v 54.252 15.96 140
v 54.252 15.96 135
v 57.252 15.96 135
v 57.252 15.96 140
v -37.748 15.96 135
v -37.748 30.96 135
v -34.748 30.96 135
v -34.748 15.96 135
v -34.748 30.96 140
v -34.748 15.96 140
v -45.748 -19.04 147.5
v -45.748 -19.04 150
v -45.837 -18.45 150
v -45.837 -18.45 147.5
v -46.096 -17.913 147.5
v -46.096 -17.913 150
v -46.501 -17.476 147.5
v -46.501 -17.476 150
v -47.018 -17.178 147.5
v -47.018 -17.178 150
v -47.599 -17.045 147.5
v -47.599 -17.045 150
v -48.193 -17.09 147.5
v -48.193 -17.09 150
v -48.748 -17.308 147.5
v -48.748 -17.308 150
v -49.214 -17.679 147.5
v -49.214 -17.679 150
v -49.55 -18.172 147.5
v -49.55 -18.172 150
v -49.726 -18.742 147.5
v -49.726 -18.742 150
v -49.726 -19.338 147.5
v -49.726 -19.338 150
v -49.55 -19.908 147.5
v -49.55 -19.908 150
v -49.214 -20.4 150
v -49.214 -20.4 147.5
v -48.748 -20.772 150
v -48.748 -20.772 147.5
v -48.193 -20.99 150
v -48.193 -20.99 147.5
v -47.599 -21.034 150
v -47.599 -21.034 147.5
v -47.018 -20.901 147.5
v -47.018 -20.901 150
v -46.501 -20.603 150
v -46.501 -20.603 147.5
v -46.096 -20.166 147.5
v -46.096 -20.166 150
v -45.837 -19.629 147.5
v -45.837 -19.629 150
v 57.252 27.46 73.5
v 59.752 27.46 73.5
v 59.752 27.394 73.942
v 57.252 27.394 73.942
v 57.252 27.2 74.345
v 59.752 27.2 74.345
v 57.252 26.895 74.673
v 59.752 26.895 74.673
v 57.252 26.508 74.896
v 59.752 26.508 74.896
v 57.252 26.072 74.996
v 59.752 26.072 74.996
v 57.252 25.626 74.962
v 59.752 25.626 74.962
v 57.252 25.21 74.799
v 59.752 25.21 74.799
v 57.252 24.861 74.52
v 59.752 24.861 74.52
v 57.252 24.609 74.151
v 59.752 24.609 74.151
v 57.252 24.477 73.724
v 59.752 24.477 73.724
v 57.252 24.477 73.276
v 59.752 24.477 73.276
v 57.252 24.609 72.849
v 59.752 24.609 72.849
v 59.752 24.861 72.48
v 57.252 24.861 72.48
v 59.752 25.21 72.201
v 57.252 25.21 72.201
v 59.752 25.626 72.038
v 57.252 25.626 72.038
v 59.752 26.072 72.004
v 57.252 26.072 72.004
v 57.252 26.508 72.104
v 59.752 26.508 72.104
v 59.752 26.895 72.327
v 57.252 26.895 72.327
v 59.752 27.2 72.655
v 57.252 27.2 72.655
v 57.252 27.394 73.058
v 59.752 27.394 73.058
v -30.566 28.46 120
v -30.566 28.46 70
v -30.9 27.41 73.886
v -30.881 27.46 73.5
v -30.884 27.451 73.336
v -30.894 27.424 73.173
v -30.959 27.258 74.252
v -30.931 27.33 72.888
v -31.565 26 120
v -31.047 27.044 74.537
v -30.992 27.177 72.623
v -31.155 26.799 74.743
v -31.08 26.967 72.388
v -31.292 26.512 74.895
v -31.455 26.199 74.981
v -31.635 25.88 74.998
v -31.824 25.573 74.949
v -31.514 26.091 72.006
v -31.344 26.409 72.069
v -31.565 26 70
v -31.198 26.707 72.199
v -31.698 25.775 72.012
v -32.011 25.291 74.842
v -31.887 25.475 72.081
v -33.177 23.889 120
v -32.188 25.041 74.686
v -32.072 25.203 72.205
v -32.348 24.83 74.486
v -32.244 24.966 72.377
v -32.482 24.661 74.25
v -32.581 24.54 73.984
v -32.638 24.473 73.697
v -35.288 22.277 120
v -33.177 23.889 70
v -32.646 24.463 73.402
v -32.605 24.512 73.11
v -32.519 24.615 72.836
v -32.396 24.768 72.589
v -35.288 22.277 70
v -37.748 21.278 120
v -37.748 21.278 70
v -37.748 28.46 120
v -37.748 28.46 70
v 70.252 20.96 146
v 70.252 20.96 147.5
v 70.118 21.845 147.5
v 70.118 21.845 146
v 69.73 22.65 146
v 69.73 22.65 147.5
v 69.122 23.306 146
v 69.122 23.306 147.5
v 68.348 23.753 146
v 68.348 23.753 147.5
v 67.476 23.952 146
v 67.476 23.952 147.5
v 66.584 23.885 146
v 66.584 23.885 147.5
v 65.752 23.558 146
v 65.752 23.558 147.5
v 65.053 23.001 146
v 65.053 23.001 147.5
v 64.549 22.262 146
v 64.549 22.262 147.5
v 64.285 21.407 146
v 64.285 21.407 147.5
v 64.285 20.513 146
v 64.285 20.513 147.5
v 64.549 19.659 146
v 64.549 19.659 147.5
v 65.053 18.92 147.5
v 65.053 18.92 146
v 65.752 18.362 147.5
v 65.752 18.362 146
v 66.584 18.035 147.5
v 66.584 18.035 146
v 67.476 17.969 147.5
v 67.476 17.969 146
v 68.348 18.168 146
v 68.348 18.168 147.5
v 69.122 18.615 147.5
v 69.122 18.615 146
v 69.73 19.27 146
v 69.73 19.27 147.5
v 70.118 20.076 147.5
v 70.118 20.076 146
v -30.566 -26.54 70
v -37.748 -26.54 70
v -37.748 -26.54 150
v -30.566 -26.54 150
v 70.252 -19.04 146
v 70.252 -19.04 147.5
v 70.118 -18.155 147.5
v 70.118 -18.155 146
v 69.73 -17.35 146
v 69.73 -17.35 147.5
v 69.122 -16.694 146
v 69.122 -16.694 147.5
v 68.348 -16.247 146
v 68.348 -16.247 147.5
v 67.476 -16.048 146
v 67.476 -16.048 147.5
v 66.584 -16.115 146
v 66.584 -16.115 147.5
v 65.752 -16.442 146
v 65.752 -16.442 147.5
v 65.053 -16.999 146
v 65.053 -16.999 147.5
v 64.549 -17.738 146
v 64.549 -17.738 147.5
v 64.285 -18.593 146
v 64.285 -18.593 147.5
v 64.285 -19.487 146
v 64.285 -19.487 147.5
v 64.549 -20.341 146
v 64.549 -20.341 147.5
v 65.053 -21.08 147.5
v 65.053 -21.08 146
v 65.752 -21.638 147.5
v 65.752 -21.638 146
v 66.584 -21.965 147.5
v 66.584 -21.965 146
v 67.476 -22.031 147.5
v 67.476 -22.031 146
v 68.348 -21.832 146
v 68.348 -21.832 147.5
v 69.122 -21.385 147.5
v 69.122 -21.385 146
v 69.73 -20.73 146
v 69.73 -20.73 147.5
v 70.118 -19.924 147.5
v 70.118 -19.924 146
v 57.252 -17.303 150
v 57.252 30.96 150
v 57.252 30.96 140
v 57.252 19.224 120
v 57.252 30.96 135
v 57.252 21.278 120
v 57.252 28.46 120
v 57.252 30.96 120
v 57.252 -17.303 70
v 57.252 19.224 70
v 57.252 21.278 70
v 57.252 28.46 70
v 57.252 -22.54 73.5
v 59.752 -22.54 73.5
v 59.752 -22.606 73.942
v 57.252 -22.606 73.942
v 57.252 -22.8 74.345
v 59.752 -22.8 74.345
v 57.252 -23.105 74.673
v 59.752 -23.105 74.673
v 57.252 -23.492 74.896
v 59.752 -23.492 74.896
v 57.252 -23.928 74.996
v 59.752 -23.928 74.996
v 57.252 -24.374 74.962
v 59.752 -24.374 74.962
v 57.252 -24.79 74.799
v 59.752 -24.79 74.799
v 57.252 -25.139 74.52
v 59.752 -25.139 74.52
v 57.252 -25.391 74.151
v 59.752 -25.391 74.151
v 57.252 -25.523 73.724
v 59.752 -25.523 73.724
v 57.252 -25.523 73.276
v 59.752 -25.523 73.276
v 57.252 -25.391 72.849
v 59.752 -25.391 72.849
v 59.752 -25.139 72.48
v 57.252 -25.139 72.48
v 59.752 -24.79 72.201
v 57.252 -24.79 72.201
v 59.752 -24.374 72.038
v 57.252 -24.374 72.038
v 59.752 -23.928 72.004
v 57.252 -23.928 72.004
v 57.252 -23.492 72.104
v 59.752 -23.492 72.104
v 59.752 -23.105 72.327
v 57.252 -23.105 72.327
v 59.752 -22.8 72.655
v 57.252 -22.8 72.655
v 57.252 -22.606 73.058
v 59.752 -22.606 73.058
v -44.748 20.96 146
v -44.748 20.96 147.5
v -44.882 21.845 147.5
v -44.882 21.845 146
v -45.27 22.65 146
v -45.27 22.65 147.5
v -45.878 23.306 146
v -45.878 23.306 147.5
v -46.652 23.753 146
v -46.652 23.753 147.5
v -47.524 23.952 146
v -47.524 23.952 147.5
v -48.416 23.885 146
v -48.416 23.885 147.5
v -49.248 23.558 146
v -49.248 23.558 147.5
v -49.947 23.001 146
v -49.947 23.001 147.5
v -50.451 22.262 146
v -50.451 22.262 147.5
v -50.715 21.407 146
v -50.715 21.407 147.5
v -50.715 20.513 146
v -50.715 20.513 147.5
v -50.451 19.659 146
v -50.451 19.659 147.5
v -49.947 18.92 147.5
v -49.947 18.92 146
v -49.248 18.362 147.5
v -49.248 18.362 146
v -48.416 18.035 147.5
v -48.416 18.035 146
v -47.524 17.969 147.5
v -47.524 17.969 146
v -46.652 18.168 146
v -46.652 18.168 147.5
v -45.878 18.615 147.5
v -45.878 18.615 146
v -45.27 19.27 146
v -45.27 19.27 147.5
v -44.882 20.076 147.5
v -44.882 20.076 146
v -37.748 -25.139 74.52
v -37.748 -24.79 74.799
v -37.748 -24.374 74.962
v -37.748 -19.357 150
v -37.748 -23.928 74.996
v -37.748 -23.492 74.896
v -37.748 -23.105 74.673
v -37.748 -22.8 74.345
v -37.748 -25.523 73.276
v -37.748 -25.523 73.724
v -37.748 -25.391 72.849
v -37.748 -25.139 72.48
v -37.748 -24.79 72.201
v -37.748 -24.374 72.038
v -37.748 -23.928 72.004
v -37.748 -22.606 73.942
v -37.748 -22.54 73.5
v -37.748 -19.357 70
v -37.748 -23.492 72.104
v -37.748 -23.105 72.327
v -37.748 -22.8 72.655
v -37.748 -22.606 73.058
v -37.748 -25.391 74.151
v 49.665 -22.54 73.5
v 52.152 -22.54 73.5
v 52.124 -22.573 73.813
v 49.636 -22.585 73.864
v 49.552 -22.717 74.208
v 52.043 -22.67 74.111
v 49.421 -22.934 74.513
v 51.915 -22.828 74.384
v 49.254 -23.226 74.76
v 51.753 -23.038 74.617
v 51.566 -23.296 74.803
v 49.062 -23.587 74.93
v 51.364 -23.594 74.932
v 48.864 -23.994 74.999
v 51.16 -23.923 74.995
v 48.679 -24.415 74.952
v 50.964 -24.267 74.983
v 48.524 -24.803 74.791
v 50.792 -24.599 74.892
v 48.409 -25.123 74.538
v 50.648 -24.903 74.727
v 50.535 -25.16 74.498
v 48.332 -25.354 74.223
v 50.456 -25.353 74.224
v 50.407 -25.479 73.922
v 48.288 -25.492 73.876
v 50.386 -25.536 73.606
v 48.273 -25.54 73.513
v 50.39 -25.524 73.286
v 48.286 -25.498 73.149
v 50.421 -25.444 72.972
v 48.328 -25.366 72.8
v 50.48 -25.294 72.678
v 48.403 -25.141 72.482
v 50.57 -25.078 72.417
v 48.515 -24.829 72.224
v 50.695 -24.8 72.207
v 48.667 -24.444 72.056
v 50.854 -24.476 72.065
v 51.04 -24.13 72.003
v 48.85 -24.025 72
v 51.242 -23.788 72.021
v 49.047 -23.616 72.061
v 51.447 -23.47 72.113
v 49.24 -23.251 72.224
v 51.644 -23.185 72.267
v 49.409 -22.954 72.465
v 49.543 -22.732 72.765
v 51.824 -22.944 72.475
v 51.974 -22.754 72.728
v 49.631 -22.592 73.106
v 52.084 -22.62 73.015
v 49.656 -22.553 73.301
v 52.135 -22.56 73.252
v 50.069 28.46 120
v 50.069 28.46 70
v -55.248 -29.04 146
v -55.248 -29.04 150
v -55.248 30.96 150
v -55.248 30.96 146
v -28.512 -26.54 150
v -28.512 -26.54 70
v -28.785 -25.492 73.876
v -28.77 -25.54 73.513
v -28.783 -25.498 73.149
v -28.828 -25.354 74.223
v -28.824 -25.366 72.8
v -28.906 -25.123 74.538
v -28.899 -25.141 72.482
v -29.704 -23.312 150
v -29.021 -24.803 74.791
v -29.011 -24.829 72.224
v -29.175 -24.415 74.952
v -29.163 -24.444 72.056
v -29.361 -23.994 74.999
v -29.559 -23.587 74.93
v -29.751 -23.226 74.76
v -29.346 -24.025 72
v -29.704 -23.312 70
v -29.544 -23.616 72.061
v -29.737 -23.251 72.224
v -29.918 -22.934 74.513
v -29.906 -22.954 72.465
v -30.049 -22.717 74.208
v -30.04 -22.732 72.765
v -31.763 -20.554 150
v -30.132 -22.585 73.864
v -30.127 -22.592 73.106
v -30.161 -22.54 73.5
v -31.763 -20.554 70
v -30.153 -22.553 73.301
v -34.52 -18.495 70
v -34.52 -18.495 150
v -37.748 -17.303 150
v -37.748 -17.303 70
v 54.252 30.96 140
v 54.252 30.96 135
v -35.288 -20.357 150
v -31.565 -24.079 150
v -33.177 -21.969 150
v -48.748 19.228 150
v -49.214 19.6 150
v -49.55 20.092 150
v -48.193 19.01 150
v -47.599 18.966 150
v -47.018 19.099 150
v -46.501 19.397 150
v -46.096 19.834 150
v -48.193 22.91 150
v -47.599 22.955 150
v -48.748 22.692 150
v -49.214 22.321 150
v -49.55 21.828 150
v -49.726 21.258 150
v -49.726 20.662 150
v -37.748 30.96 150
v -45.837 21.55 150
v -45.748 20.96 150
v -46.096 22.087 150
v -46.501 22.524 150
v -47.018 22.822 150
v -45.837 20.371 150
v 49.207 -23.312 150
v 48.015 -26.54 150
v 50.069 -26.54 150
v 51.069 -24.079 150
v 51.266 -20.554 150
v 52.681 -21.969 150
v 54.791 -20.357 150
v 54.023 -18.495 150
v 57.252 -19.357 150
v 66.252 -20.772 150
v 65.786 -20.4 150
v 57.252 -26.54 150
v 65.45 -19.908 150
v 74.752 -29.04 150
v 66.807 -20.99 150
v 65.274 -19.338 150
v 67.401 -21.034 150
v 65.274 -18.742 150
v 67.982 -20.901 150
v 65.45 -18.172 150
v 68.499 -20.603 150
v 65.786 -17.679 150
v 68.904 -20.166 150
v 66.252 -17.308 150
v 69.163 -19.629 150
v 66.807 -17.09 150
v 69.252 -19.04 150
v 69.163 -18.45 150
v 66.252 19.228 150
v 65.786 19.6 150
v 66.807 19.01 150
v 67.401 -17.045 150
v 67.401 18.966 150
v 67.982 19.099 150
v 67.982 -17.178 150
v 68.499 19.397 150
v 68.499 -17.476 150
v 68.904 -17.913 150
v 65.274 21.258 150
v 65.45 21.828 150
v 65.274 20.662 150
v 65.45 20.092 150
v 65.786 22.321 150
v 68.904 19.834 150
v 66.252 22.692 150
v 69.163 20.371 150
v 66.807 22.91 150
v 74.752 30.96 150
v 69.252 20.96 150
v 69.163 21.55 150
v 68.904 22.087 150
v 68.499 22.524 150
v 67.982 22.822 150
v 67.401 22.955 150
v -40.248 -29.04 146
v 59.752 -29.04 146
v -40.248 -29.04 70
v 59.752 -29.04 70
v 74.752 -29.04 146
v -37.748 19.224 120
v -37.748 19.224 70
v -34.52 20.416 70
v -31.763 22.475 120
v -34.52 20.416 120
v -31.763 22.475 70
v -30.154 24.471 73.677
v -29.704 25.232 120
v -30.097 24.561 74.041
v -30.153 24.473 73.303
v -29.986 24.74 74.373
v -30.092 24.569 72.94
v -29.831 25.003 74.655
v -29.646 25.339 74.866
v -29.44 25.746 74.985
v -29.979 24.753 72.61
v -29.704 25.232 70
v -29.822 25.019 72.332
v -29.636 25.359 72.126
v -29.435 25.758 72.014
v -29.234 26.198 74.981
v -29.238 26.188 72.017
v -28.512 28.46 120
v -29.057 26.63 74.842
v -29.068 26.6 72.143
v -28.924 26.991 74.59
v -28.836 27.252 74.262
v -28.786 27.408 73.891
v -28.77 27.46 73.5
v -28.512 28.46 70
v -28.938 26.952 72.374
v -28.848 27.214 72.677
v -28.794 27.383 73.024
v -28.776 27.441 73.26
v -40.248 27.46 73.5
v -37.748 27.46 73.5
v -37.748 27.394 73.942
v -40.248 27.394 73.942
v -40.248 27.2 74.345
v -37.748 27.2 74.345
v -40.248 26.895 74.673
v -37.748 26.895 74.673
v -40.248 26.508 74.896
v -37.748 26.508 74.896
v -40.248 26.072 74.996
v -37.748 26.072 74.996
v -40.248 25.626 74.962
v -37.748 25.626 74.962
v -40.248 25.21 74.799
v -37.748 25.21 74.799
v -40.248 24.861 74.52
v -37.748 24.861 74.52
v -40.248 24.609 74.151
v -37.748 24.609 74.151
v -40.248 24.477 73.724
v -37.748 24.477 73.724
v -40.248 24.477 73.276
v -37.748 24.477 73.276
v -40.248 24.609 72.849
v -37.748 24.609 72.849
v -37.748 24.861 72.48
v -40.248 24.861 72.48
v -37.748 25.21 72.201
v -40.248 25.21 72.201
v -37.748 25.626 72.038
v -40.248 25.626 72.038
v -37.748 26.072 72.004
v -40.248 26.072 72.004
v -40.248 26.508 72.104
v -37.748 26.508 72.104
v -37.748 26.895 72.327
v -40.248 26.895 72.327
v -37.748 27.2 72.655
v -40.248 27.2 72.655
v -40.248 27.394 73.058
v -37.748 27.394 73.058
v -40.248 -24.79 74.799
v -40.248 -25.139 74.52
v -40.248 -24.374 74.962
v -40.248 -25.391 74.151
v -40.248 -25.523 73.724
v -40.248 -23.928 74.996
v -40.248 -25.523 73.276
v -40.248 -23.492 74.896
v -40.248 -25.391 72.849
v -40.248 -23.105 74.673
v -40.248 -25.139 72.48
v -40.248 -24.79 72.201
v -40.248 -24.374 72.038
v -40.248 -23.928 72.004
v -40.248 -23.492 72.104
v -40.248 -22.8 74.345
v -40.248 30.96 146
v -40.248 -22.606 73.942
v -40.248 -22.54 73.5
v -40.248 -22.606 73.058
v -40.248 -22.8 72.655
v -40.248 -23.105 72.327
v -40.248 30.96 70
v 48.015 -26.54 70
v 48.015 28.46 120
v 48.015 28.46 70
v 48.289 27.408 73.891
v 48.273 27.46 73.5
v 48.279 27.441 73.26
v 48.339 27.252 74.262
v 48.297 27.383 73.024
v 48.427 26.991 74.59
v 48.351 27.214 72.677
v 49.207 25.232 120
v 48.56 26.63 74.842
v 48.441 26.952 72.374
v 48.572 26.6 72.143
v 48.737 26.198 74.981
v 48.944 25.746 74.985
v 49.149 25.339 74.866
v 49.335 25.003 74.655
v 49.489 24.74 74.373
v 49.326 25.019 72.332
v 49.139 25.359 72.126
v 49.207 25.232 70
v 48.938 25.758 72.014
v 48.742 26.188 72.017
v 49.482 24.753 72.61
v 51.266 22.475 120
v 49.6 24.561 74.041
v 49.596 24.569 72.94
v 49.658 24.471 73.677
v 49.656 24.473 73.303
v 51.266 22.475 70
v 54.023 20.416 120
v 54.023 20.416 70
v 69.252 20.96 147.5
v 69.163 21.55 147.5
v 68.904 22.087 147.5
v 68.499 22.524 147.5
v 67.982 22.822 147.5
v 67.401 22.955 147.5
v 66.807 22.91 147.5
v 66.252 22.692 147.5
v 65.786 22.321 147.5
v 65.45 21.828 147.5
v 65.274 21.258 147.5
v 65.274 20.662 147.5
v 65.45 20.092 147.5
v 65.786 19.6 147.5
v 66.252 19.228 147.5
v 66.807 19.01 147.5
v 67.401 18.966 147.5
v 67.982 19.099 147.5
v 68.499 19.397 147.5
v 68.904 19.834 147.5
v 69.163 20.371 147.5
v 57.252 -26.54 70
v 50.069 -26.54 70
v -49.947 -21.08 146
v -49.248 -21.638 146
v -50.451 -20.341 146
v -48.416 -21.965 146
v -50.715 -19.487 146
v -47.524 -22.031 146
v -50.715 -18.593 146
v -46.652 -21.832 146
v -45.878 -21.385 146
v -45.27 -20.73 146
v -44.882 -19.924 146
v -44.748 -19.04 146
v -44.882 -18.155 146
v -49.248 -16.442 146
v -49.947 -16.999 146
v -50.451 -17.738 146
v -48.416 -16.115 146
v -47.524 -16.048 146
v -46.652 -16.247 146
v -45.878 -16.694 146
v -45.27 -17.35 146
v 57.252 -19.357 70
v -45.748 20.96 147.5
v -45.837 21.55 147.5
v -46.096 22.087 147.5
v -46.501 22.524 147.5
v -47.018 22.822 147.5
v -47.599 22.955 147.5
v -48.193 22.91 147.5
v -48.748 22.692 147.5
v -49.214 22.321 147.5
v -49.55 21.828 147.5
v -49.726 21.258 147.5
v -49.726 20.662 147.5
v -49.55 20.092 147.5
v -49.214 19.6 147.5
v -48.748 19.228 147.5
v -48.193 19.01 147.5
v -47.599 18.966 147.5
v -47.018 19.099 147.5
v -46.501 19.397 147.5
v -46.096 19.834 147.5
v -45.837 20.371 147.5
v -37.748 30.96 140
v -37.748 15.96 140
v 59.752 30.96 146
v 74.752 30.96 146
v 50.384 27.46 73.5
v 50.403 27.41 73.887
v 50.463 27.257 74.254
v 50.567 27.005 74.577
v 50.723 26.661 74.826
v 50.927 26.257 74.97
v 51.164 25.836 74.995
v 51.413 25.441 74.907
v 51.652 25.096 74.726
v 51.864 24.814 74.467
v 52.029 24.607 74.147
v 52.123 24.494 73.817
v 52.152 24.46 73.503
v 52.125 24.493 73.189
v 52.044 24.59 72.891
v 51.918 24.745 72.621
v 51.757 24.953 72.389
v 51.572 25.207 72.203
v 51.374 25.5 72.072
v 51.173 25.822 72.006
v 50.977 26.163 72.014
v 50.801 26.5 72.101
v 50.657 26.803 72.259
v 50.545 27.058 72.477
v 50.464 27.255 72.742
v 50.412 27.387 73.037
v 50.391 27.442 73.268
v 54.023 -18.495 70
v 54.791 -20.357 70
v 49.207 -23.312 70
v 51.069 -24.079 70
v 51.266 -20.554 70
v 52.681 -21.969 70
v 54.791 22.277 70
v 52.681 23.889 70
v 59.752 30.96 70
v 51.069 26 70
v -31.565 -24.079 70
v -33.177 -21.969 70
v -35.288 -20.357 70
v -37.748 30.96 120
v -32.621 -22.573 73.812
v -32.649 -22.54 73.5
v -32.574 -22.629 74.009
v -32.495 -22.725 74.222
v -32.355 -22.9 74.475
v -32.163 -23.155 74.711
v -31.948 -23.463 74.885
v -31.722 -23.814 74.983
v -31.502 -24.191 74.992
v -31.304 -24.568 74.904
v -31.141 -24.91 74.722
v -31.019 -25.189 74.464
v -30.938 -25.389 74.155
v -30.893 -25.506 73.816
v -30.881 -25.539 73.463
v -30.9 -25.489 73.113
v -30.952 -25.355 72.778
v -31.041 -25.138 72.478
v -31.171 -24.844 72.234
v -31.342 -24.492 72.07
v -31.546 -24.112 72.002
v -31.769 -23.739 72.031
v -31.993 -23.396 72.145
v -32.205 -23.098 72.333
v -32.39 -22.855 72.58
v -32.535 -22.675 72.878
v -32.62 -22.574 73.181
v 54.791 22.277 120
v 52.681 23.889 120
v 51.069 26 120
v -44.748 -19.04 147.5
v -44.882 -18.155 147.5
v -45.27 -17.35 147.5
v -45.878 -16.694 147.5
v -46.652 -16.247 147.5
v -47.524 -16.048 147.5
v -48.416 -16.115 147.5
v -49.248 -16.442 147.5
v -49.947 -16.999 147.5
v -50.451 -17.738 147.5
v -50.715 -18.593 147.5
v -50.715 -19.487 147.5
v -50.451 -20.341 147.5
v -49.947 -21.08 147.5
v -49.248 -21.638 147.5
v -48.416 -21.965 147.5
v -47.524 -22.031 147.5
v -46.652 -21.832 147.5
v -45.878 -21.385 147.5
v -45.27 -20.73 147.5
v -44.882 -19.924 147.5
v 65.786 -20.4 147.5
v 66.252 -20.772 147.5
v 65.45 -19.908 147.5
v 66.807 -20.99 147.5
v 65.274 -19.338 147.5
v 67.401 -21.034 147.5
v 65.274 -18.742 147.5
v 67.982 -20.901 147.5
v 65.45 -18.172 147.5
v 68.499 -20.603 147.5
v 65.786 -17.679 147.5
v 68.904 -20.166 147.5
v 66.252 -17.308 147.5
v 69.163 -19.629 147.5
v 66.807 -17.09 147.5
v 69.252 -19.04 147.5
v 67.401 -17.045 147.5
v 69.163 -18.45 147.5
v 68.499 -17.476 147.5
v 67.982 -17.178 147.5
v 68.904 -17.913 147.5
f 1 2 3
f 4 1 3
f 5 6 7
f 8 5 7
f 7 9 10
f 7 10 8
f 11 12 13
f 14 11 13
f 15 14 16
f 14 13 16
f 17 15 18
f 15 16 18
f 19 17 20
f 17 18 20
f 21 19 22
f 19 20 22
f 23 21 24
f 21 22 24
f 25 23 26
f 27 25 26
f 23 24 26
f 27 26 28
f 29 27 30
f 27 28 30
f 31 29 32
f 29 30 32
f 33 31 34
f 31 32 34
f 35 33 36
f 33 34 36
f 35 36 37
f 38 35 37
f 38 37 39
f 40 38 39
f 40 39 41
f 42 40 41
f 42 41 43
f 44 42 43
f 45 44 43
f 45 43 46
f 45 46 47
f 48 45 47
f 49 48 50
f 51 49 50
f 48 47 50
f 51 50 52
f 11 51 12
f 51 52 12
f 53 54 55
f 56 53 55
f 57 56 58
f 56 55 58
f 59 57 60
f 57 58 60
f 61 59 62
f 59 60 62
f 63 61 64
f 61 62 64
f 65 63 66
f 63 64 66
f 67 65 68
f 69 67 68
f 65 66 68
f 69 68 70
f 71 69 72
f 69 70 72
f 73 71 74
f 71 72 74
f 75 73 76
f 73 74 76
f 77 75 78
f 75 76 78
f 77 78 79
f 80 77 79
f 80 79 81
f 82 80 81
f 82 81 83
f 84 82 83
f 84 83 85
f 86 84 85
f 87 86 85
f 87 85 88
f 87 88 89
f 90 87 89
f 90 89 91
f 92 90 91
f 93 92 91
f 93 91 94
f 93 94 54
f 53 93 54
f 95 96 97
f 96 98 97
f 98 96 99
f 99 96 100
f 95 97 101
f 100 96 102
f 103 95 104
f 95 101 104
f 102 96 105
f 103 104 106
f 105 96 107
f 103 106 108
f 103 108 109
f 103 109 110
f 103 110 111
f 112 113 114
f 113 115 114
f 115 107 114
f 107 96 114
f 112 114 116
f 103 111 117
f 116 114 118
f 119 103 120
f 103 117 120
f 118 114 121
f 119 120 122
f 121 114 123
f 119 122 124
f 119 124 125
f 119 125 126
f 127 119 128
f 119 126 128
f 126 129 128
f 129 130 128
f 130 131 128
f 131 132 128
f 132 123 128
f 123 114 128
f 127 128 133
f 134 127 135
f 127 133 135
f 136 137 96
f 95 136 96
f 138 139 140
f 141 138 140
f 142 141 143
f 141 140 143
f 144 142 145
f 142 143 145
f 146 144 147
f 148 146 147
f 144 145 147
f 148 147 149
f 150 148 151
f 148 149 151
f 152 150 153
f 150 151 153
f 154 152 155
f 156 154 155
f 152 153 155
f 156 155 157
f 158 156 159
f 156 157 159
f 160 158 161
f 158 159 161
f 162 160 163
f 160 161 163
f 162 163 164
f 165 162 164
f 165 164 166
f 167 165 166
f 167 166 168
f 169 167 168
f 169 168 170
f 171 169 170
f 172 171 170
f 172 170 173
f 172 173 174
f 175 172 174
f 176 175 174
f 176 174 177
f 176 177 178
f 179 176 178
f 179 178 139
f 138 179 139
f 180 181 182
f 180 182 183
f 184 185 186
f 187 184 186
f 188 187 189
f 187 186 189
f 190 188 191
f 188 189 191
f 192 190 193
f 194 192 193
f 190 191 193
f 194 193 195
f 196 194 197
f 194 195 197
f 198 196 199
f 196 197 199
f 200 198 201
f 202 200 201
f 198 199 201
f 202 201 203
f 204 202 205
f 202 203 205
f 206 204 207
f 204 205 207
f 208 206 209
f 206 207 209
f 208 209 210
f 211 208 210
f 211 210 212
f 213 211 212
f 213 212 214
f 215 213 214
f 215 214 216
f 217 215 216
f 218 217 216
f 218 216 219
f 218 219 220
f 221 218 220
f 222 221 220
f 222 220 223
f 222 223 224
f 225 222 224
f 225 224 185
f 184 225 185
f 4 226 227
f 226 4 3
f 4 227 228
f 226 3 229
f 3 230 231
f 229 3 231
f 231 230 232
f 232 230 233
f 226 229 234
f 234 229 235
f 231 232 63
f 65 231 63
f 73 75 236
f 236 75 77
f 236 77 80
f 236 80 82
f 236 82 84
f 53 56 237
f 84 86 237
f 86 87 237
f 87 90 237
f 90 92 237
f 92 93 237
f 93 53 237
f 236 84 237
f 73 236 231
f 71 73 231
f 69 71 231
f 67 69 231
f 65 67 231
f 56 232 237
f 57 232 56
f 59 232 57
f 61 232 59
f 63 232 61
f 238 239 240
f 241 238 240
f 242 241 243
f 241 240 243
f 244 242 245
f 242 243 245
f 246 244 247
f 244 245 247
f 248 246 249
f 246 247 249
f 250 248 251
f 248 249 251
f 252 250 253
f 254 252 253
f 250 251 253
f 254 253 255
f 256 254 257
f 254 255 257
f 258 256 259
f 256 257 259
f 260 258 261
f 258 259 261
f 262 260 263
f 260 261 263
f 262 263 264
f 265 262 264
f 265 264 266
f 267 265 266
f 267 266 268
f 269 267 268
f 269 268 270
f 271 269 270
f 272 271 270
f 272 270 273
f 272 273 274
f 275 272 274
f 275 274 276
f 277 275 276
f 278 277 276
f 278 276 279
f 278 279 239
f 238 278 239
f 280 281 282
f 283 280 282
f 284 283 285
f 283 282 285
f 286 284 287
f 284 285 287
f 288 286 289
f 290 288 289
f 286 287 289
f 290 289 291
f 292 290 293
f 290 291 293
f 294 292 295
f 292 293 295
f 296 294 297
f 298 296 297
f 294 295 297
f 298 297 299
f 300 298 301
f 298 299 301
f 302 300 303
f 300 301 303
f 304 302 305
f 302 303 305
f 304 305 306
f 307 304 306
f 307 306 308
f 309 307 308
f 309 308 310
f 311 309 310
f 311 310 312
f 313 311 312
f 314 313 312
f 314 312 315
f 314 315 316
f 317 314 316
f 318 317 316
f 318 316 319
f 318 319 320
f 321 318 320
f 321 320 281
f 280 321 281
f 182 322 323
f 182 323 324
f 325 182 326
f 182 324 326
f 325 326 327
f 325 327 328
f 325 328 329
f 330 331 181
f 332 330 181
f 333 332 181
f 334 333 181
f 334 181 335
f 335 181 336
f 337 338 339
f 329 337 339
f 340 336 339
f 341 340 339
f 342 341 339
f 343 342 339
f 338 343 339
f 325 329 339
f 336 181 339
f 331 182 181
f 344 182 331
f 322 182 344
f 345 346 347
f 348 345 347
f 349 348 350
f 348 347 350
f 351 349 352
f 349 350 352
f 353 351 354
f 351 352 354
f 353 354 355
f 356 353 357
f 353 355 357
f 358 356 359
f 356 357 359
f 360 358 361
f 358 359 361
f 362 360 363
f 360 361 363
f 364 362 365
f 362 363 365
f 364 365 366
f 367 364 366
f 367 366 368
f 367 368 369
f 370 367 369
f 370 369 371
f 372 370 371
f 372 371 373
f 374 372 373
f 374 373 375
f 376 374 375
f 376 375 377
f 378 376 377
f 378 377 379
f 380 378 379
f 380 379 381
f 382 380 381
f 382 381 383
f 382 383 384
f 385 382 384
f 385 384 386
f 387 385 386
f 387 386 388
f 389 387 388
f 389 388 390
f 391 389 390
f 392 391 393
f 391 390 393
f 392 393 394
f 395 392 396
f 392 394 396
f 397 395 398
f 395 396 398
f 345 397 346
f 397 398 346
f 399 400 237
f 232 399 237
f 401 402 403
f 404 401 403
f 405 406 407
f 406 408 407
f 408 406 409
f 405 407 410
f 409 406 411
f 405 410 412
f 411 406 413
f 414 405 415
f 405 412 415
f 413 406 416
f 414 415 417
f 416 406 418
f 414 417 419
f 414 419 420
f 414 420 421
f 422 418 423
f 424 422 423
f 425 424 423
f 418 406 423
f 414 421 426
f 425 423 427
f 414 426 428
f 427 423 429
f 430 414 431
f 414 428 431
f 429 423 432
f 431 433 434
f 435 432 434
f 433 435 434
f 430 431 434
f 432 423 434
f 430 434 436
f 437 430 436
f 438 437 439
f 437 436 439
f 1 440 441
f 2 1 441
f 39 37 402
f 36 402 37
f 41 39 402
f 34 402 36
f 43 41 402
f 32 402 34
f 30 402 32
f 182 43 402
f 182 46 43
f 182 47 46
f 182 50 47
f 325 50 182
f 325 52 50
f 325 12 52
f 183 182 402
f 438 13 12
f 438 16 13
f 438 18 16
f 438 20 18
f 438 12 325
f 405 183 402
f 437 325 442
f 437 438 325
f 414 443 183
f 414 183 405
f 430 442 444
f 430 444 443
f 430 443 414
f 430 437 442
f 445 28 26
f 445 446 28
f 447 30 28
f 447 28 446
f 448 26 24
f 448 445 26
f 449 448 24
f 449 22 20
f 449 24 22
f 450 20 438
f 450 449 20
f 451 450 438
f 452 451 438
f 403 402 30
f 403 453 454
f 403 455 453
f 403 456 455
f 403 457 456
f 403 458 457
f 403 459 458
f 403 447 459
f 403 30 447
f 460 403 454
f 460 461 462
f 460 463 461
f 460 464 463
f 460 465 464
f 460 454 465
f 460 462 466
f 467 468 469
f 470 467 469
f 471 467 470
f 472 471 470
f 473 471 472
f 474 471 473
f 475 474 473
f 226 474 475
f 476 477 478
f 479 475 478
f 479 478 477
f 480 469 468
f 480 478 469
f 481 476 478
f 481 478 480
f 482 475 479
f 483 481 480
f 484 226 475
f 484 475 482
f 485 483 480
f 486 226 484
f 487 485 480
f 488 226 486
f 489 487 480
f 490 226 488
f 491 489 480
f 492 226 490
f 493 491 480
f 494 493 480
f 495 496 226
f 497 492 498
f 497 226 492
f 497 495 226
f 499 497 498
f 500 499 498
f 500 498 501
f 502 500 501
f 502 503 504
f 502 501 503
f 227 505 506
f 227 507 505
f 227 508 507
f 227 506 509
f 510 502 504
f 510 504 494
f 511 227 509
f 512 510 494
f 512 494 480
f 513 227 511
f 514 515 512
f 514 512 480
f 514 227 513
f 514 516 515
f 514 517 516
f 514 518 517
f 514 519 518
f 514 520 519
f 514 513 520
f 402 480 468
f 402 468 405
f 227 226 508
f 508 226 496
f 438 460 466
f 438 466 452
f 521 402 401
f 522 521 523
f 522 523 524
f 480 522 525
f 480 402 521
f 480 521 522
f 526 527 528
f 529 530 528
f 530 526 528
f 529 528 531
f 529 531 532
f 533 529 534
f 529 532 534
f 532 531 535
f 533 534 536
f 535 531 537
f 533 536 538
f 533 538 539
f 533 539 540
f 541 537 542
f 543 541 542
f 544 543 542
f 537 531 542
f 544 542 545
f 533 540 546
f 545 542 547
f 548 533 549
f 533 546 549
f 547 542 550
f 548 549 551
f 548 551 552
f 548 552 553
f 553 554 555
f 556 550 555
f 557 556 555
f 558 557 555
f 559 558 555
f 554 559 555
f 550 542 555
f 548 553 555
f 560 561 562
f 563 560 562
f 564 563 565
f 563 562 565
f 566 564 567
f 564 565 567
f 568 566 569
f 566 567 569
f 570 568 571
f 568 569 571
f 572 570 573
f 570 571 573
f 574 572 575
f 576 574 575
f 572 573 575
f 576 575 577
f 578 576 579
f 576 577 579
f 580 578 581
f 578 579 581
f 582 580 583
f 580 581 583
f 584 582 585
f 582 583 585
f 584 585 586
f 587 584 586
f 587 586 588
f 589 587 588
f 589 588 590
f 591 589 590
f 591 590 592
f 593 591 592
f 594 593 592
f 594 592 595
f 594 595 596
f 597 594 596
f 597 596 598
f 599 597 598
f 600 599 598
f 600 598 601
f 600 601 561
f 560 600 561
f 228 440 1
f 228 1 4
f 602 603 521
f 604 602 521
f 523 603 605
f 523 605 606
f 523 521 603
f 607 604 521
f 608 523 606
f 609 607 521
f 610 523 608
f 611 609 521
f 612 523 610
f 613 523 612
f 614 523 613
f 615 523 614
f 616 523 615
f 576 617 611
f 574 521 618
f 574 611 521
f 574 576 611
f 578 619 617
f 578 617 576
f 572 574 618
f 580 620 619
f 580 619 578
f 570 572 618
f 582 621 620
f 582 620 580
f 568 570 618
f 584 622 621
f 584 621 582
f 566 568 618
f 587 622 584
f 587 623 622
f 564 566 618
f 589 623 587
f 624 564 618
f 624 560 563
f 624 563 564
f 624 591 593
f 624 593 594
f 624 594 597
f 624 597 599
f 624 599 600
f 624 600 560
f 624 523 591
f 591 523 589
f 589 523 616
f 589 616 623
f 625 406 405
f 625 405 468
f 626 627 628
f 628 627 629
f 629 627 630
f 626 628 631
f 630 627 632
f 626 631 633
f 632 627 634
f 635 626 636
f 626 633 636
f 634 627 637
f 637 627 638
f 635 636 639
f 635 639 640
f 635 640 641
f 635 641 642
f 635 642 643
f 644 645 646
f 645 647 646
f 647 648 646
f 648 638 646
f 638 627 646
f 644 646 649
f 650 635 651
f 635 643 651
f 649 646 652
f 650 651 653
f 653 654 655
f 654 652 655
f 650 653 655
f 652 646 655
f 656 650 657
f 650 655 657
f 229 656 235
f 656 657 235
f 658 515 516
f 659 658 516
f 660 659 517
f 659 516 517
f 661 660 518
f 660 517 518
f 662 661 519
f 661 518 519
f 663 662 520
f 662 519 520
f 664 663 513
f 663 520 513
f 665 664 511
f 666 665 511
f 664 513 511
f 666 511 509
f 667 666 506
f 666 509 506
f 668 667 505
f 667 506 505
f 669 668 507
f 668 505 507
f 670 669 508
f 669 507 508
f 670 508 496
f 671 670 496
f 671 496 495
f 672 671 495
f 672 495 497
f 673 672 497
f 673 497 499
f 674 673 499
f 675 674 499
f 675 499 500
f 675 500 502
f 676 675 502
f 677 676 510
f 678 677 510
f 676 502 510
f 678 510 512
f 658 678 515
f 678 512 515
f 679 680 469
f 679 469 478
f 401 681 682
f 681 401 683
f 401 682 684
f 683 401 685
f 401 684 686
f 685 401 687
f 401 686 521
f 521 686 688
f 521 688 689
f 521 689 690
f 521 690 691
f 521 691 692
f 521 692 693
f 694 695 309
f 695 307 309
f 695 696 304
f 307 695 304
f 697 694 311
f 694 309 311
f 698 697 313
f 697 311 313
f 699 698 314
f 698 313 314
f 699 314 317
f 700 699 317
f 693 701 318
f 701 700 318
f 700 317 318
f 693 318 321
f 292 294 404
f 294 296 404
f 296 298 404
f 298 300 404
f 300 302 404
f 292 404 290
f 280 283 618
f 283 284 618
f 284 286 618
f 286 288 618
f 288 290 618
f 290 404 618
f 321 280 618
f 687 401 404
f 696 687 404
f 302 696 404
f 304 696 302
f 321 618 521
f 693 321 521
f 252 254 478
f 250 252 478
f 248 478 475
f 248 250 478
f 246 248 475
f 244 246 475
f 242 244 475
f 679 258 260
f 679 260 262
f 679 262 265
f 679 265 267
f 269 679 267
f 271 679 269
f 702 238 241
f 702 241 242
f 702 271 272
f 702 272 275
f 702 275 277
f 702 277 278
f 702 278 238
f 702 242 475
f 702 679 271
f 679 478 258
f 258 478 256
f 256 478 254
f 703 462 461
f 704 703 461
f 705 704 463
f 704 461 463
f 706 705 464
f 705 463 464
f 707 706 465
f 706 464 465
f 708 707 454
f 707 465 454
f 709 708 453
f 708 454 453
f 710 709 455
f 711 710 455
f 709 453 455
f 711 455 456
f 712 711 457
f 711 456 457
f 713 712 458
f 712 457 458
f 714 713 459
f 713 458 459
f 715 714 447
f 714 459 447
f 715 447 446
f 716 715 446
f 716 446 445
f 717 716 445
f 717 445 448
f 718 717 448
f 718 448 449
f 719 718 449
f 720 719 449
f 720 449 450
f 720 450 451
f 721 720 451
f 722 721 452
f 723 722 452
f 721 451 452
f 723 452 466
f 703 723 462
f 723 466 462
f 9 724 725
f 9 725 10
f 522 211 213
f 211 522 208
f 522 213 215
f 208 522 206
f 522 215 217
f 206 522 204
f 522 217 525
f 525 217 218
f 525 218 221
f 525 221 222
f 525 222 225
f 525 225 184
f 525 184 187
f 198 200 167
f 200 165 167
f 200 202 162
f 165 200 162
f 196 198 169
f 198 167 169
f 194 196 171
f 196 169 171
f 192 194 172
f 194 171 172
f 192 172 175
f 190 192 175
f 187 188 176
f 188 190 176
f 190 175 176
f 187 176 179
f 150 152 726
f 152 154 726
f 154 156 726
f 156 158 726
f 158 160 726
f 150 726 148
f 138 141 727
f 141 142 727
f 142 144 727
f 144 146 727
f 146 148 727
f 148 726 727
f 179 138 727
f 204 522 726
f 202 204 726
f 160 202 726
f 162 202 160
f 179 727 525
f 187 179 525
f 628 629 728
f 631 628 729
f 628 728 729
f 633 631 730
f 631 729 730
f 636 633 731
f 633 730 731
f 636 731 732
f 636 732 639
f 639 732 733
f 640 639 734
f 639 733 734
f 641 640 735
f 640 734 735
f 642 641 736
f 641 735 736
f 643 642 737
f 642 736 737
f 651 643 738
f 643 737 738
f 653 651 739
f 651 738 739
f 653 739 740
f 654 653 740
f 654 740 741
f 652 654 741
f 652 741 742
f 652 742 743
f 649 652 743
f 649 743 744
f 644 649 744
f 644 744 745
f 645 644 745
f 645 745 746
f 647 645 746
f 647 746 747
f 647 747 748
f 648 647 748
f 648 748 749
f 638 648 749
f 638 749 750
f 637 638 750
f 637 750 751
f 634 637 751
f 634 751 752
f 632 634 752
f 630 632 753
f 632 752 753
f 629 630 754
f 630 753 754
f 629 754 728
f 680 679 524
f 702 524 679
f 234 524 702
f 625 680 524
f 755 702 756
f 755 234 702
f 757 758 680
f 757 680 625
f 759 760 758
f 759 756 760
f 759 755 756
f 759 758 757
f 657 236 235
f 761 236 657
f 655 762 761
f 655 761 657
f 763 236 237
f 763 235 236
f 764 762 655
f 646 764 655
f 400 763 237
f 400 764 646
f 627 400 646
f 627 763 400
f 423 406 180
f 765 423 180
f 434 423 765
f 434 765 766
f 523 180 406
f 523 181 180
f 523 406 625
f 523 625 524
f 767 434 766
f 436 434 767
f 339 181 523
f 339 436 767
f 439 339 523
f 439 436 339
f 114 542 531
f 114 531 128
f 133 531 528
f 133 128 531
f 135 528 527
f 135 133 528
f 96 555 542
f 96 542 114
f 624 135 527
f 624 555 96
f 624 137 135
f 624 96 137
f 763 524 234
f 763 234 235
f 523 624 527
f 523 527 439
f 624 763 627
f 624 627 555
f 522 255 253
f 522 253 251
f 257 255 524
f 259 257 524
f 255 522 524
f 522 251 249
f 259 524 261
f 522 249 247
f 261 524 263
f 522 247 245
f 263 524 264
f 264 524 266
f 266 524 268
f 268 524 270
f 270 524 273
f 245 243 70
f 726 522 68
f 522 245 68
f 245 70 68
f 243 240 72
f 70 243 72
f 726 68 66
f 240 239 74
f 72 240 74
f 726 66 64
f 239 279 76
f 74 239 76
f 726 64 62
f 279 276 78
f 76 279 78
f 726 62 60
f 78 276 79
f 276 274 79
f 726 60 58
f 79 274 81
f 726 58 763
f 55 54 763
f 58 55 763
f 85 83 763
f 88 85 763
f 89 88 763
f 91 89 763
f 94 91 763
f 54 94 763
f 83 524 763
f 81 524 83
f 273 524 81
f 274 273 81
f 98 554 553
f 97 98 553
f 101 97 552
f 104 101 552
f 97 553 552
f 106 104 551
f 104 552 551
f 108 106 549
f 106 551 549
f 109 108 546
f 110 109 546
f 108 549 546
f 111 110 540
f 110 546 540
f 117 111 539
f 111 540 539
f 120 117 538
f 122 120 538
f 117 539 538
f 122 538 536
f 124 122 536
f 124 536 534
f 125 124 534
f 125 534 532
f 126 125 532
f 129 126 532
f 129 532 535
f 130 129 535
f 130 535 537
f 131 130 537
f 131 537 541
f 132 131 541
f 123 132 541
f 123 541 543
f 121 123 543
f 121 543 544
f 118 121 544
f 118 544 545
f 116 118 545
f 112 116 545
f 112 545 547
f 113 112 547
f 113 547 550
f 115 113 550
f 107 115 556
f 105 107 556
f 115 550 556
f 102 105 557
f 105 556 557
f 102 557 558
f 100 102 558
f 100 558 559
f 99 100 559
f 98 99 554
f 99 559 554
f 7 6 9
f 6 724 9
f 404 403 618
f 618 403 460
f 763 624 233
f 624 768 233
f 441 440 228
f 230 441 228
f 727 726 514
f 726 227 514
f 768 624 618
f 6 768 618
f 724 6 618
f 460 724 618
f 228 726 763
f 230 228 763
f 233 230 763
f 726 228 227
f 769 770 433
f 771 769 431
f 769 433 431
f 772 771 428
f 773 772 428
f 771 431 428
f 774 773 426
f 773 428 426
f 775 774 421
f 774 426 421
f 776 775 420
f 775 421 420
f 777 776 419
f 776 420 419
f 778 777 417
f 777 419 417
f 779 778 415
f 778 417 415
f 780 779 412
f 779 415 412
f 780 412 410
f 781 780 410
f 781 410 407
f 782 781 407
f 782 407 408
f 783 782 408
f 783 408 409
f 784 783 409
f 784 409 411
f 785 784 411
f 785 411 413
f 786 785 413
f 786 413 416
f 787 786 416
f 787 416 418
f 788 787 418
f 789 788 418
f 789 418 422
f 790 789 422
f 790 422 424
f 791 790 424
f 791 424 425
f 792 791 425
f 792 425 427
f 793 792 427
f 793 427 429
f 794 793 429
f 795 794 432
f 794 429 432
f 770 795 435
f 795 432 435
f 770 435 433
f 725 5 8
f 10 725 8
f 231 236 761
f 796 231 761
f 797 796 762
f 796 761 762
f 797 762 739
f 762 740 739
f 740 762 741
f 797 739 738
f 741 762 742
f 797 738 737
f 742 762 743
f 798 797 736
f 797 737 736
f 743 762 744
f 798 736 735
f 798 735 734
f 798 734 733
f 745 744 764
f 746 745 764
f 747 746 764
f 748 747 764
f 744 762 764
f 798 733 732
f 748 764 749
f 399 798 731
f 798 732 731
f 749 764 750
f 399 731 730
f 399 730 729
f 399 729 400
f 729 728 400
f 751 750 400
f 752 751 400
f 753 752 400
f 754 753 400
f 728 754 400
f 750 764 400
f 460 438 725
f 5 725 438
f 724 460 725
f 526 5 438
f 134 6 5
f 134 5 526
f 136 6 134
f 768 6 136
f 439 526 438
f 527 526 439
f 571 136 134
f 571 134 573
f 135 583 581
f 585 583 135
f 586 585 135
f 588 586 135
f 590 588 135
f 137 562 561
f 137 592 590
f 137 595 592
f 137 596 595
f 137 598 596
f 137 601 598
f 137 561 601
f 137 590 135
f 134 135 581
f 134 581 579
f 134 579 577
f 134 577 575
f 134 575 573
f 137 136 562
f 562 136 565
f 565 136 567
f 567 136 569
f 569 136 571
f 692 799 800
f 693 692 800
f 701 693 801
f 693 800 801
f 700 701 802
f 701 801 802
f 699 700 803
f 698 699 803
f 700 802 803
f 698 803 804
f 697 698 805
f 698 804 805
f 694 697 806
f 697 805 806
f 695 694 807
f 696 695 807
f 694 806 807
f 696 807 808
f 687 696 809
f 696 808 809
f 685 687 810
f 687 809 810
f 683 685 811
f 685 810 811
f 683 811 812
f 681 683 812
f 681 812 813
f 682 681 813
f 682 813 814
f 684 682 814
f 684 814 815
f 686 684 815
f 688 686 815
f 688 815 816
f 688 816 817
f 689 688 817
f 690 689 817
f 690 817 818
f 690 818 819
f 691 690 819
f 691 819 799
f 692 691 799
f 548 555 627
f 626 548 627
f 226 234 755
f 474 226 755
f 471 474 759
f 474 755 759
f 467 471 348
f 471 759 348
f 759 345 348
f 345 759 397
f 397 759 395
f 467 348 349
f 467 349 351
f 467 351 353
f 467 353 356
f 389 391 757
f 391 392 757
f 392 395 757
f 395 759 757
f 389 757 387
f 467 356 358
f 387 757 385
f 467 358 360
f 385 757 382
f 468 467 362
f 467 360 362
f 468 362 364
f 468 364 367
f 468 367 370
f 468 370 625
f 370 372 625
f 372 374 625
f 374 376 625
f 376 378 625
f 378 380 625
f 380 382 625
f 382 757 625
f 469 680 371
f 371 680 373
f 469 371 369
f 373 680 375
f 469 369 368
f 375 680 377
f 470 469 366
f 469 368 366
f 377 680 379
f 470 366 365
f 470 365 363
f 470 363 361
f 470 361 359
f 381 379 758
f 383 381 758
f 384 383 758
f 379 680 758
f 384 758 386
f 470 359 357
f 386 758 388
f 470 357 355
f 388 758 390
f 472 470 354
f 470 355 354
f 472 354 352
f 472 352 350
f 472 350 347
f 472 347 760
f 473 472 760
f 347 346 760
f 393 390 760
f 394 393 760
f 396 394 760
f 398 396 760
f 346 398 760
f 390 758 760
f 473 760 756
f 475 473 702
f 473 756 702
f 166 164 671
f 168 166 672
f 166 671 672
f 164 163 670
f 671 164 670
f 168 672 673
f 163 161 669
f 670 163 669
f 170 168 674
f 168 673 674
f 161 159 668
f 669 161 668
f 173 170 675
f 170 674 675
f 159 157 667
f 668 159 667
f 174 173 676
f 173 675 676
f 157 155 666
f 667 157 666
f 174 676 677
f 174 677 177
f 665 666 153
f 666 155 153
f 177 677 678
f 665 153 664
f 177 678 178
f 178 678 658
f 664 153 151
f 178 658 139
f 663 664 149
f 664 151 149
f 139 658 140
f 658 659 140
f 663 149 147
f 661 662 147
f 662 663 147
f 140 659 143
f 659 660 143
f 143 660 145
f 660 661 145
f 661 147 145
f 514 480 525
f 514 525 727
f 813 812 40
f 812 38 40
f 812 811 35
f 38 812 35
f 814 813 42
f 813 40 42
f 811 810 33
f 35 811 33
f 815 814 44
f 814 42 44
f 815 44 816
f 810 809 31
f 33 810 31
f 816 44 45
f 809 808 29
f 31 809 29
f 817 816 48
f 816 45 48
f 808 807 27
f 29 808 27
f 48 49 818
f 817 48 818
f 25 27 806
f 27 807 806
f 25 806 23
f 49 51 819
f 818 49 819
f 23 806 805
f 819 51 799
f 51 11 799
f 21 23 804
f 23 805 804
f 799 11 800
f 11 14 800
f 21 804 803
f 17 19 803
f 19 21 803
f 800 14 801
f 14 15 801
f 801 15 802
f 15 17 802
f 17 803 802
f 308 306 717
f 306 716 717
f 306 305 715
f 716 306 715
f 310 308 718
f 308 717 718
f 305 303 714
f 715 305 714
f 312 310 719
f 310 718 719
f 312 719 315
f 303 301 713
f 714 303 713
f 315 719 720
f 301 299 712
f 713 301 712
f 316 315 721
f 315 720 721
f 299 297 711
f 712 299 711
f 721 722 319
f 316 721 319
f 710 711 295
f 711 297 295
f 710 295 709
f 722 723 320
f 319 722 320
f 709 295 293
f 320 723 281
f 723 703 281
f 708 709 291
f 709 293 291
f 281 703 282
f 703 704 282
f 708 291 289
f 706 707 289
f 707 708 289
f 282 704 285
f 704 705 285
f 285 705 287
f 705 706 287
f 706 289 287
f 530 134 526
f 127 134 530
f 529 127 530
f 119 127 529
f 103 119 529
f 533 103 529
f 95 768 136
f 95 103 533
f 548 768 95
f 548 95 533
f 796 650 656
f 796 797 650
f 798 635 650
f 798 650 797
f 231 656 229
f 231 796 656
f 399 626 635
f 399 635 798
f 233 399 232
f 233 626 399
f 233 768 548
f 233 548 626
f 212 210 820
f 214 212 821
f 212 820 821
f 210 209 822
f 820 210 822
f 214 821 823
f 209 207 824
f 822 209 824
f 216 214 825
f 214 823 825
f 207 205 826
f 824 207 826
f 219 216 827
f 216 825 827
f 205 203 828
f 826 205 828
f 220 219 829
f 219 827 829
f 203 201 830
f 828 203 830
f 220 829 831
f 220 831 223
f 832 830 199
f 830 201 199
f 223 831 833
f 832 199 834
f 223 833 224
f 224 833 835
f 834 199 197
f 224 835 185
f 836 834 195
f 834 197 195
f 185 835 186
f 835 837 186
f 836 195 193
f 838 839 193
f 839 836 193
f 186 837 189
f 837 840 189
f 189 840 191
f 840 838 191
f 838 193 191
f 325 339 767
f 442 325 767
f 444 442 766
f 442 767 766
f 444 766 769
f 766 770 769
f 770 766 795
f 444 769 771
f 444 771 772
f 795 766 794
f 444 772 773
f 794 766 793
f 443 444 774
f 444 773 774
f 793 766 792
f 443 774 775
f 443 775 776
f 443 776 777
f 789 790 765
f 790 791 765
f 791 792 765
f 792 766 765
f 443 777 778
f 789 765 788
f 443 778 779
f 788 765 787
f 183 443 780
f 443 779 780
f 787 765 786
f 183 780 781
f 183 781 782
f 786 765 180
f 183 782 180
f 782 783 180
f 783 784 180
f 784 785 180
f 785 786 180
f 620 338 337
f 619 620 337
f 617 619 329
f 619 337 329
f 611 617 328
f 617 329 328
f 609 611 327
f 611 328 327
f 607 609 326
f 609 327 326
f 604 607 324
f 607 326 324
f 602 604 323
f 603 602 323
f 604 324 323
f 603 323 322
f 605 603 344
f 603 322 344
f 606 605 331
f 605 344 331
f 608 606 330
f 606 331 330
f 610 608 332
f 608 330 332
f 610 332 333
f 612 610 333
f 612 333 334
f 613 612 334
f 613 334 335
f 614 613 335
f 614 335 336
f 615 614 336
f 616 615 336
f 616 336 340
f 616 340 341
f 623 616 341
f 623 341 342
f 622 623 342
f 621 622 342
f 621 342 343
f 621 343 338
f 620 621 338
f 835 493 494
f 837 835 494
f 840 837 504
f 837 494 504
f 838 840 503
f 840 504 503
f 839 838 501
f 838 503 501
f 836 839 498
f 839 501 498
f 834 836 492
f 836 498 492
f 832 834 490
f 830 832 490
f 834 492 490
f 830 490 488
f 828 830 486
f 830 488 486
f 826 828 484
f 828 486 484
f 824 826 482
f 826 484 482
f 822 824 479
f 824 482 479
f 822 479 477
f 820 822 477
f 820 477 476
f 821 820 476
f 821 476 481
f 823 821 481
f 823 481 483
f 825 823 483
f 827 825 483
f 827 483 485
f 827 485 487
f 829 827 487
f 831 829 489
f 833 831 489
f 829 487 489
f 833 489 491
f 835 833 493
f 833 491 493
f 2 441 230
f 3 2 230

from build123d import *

# Parameters (mm, degrees)
SKETCH1_W                = 100
SKETCH1_H                = 60
BOSS_EXTRUDE1_DEPTH      = 150
SKETCH2_W                = 95
SKETCH2_H                = 30
CUT_EXTRUDE1_DEPTH       = 20
BOSS_EXTRUDE2_DEPTH      = 13
BOSS_EXTRUDE2_DEPTH_BACK = 5
SKETCH3_W                = 106
SKETCH3_H                = 66
SKETCH3_W_2              = 100
SKETCH3_H_2              = 60
SKETCH4_R                = 1.5
CUT_EXTRUDE2_DEPTH       = 120
SKETCH5_R                = 3
CUT_EXTRUDE3_DEPTH       = 1
CUT_EXTRUDE4_START       = -1
SKETCH6_R                = 3
CUT_EXTRUDE4_DEPTH       = 1
SKETCH8_W                = 157.221191822
SKETCH8_H                = 99.5531871
CUT_EXTRUDE6_DEPTH       = 83
SKETCH9_R                = 1.5
CUT_EXTRUDE7_DEPTH       = 120
SKETCH10_W               = 3
SKETCH10_H               = 5
BOSS_EXTRUDE3_DEPTH      = 15
SKETCH11_W               = 15
SKETCH11_H               = 60
SKETCH11_R               = 3
BOSS_EXTRUDE4_DEPTH      = 4
SKETCH11_3_R             = 3
SKETCH11_3_R_2           = 2
BOSS_EXTRUDE5_DEPTH      = 2.5


with BuildPart() as part:
    # Sketch1 → Boss-Extrude1 (new body)
    with BuildSketch(Plane.XY):
        with Locations((9.751655629, 0.960264901)):
            Rectangle(SKETCH1_W, SKETCH1_H)
        with BuildLine():
            Line((-37.748344371, 21.277806535), (-37.748344371, 28.460264901))
            Line((-37.748344371, 28.460264901), (-30.565886005, 28.460264901))
            ThreePointArc((-30.565886005, 28.460264901), (-33.177276559, 23.889197089), (-37.748344371, 21.277806535))
        make_face(mode=Mode.SUBTRACT)
        with BuildLine():
            Line((-37.748344371, -17.303040505), (-37.748344371, 19.223570306))
            ThreePointArc((-37.748344371, 19.223570306), (-31.763062997, 22.474983526), (-28.511649777, 28.460264901))
            Line((-28.511649777, 28.460264901), (48.014961035, 28.460264901))
            ThreePointArc((48.014961035, 28.460264901), (51.266374255, 22.474983526), (57.251655629, 19.223570306))
            Line((57.251655629, 19.223570306), (57.251655629, -17.303040505))
            ThreePointArc((57.251655629, -17.303040505), (51.266374255, -20.554453725), (48.014961035, -26.539735099))
            Line((48.014961035, -26.539735099), (-28.511649777, -26.539735099))
            ThreePointArc((-28.511649777, -26.539735099), (-31.763062997, -20.554453725), (-37.748344371, -17.303040505))
        make_face(mode=Mode.SUBTRACT)
        with BuildLine():
            Line((-37.748344371, -26.539735099), (-37.748344371, -19.357276734))
            ThreePointArc((-37.748344371, -19.357276734), (-33.177276559, -21.968667287), (-30.565886005, -26.539735099))
            Line((-30.565886005, -26.539735099), (-37.748344371, -26.539735099))
        make_face(mode=Mode.SUBTRACT)
        with BuildLine():
            Line((57.251655629, -26.539735099), (50.069197264, -26.539735099))
            ThreePointArc((50.069197264, -26.539735099), (52.680587817, -21.968667287), (57.251655629, -19.357276734))
            Line((57.251655629, -19.357276734), (57.251655629, -26.539735099))
        make_face(mode=Mode.SUBTRACT)
        with BuildLine():
            Line((57.251655629, 28.460264901), (57.251655629, 21.277806535))
            ThreePointArc((57.251655629, 21.277806535), (52.680587817, 23.889197089), (50.069197264, 28.460264901))
            Line((50.069197264, 28.460264901), (57.251655629, 28.460264901))
        make_face(mode=Mode.SUBTRACT)
    extrude(amount=BOSS_EXTRUDE1_DEPTH)

    # Sketch2 → Cut-Extrude1 (cut)
    with BuildSketch(Plane(origin=(0, 30.960264901, 0), x_dir=(1, 0, 0), z_dir=(0, 1, 0))):
        with Locations((9.751655629, -135)):
            Rectangle(SKETCH2_W, SKETCH2_H)
    extrude(amount=-CUT_EXTRUDE1_DEPTH, mode=Mode.SUBTRACT)

    # Sketch3 → Boss-Extrude2 (add, two sides: drawn at the far end of the back side and taken through both)
    with BuildSketch(Plane(origin=(0, 0, 0), x_dir=(-1, 0, 0), z_dir=(0, 0, -1)).offset(-BOSS_EXTRUDE2_DEPTH_BACK)):
        with Locations((-9.751655629, 0.960264901)):
            Rectangle(SKETCH3_W, SKETCH3_H)
        with Locations((-9.751655629, 0.960264901)):
            Rectangle(SKETCH3_W_2, SKETCH3_H_2, mode=Mode.SUBTRACT)
    extrude(amount=BOSS_EXTRUDE2_DEPTH + BOSS_EXTRUDE2_DEPTH_BACK)

    # Sketch4 → Cut-Extrude2 (cut)
    with BuildSketch(Plane.ZY.offset(43.248344371)):
        with Locations((-4, -24.039735099)):
            Circle(SKETCH4_R)
        with Locations((-4, 25.960264901)):
            Circle(SKETCH4_R)
    extrude(amount=-CUT_EXTRUDE2_DEPTH, mode=Mode.SUBTRACT)

    # Sketch5 → Cut-Extrude3 (cut)
    with BuildSketch(Plane(origin=(62.751655629, 0, 0), x_dir=(0, 0, -1), z_dir=(1, 0, 0))):
        with Locations((4, -24.039735099)):
            Circle(SKETCH5_R)
        with Locations((4, 25.960264901)):
            Circle(SKETCH5_R)
    extrude(amount=-CUT_EXTRUDE3_DEPTH, mode=Mode.SUBTRACT)

    # Sketch6 → Cut-Extrude4 (cut)
    with BuildSketch(Plane.ZY.offset(43.248344371).offset(CUT_EXTRUDE4_START)):
        with Locations((-4, 25.960264901)):
            Circle(SKETCH6_R)
        with Locations((-4, -24.087684502)):
            Circle(SKETCH6_R)
    extrude(amount=CUT_EXTRUDE4_DEPTH, mode=Mode.SUBTRACT)

    # Sketch8 → Cut-Extrude6 (cut)
    with BuildSketch(Plane(origin=(0, 0, -13), x_dir=(-1, 0, 0), z_dir=(0, 0, -1))):
        with Locations((-4.996574538, 1.162608777)):
            Rectangle(SKETCH8_W, SKETCH8_H)
    extrude(amount=-CUT_EXTRUDE6_DEPTH, mode=Mode.SUBTRACT)

    # Sketch9 → Cut-Extrude7 (cut)
    with BuildSketch(Plane(origin=(59.751655629, 0, 0), x_dir=(0, 0, -1), z_dir=(1, 0, 0))):
        with Locations((-73.5, -24.039735099)):
            Circle(SKETCH9_R)
        with Locations((-73.5, 25.960264901)):
            Circle(SKETCH9_R)
    extrude(amount=-CUT_EXTRUDE7_DEPTH, mode=Mode.SUBTRACT)

    # Sketch10 → Boss-Extrude3 (add)
    with BuildSketch(Plane(origin=(0, 30.960264901, 0), x_dir=(1, 0, 0), z_dir=(0, 1, 0))):
        with Locations((-36.248344371, -137.5)):
            Rectangle(SKETCH10_W, SKETCH10_H)
        with Locations((55.751655629, -137.5)):
            Rectangle(SKETCH10_W, SKETCH10_H)
    extrude(amount=-BOSS_EXTRUDE3_DEPTH)

    # Sketch11 → Boss-Extrude4 (add)
    # profile 1 of 2: a face of its own
    with BuildSketch(Plane.XY.offset(150)):
        with Locations((-47.748344371, 0.960264901)):
            Rectangle(SKETCH11_W, SKETCH11_H)
        with Locations((-47.748344371, -19.039735099)):
            Circle(SKETCH11_R, mode=Mode.SUBTRACT)
        with Locations((-47.748344371, 20.960264901)):
            Circle(SKETCH11_R, mode=Mode.SUBTRACT)
    # profile 2 of 2: a face of its own
    with BuildSketch(Plane.XY.offset(150)):
        with Locations((67.251655629, 0.960264901)):
            Rectangle(SKETCH11_W, SKETCH11_H)
        with Locations((67.251655629, -19.039735099)):
            Circle(SKETCH11_R, mode=Mode.SUBTRACT)
        with Locations((67.251655629, 20.960264901)):
            Circle(SKETCH11_R, mode=Mode.SUBTRACT)
    extrude(amount=-BOSS_EXTRUDE4_DEPTH)

    # Sketch11<3> → Boss-Extrude5 (add)
    # profile 1 of 4: a face of its own
    with BuildSketch(Plane.XY.offset(150)):
        with Locations((-47.748344371, -19.039735099)):
            Circle(SKETCH11_3_R)
        with Locations((-47.748344371, -19.039735099)):
            Circle(SKETCH11_3_R_2, mode=Mode.SUBTRACT)
    # profile 2 of 4: a face of its own
    with BuildSketch(Plane.XY.offset(150)):
        with Locations((67.251655629, 20.960264901)):
            Circle(SKETCH11_3_R)
        with Locations((67.251655629, 20.960264901)):
            Circle(SKETCH11_3_R_2, mode=Mode.SUBTRACT)
    # profile 3 of 4: a face of its own
    with BuildSketch(Plane.XY.offset(150)):
        with Locations((67.251655629, -19.039735099)):
            Circle(SKETCH11_3_R)
        with Locations((67.251655629, -19.039735099)):
            Circle(SKETCH11_3_R_2, mode=Mode.SUBTRACT)
    # profile 4 of 4: a face of its own
    with BuildSketch(Plane.XY.offset(150)):
        with Locations((-47.748344371, 20.960264901)):
            Circle(SKETCH11_3_R)
        with Locations((-47.748344371, 20.960264901)):
            Circle(SKETCH11_3_R_2, mode=Mode.SUBTRACT)
    extrude(amount=-BOSS_EXTRUDE5_DEPTH)


solid = part.part
